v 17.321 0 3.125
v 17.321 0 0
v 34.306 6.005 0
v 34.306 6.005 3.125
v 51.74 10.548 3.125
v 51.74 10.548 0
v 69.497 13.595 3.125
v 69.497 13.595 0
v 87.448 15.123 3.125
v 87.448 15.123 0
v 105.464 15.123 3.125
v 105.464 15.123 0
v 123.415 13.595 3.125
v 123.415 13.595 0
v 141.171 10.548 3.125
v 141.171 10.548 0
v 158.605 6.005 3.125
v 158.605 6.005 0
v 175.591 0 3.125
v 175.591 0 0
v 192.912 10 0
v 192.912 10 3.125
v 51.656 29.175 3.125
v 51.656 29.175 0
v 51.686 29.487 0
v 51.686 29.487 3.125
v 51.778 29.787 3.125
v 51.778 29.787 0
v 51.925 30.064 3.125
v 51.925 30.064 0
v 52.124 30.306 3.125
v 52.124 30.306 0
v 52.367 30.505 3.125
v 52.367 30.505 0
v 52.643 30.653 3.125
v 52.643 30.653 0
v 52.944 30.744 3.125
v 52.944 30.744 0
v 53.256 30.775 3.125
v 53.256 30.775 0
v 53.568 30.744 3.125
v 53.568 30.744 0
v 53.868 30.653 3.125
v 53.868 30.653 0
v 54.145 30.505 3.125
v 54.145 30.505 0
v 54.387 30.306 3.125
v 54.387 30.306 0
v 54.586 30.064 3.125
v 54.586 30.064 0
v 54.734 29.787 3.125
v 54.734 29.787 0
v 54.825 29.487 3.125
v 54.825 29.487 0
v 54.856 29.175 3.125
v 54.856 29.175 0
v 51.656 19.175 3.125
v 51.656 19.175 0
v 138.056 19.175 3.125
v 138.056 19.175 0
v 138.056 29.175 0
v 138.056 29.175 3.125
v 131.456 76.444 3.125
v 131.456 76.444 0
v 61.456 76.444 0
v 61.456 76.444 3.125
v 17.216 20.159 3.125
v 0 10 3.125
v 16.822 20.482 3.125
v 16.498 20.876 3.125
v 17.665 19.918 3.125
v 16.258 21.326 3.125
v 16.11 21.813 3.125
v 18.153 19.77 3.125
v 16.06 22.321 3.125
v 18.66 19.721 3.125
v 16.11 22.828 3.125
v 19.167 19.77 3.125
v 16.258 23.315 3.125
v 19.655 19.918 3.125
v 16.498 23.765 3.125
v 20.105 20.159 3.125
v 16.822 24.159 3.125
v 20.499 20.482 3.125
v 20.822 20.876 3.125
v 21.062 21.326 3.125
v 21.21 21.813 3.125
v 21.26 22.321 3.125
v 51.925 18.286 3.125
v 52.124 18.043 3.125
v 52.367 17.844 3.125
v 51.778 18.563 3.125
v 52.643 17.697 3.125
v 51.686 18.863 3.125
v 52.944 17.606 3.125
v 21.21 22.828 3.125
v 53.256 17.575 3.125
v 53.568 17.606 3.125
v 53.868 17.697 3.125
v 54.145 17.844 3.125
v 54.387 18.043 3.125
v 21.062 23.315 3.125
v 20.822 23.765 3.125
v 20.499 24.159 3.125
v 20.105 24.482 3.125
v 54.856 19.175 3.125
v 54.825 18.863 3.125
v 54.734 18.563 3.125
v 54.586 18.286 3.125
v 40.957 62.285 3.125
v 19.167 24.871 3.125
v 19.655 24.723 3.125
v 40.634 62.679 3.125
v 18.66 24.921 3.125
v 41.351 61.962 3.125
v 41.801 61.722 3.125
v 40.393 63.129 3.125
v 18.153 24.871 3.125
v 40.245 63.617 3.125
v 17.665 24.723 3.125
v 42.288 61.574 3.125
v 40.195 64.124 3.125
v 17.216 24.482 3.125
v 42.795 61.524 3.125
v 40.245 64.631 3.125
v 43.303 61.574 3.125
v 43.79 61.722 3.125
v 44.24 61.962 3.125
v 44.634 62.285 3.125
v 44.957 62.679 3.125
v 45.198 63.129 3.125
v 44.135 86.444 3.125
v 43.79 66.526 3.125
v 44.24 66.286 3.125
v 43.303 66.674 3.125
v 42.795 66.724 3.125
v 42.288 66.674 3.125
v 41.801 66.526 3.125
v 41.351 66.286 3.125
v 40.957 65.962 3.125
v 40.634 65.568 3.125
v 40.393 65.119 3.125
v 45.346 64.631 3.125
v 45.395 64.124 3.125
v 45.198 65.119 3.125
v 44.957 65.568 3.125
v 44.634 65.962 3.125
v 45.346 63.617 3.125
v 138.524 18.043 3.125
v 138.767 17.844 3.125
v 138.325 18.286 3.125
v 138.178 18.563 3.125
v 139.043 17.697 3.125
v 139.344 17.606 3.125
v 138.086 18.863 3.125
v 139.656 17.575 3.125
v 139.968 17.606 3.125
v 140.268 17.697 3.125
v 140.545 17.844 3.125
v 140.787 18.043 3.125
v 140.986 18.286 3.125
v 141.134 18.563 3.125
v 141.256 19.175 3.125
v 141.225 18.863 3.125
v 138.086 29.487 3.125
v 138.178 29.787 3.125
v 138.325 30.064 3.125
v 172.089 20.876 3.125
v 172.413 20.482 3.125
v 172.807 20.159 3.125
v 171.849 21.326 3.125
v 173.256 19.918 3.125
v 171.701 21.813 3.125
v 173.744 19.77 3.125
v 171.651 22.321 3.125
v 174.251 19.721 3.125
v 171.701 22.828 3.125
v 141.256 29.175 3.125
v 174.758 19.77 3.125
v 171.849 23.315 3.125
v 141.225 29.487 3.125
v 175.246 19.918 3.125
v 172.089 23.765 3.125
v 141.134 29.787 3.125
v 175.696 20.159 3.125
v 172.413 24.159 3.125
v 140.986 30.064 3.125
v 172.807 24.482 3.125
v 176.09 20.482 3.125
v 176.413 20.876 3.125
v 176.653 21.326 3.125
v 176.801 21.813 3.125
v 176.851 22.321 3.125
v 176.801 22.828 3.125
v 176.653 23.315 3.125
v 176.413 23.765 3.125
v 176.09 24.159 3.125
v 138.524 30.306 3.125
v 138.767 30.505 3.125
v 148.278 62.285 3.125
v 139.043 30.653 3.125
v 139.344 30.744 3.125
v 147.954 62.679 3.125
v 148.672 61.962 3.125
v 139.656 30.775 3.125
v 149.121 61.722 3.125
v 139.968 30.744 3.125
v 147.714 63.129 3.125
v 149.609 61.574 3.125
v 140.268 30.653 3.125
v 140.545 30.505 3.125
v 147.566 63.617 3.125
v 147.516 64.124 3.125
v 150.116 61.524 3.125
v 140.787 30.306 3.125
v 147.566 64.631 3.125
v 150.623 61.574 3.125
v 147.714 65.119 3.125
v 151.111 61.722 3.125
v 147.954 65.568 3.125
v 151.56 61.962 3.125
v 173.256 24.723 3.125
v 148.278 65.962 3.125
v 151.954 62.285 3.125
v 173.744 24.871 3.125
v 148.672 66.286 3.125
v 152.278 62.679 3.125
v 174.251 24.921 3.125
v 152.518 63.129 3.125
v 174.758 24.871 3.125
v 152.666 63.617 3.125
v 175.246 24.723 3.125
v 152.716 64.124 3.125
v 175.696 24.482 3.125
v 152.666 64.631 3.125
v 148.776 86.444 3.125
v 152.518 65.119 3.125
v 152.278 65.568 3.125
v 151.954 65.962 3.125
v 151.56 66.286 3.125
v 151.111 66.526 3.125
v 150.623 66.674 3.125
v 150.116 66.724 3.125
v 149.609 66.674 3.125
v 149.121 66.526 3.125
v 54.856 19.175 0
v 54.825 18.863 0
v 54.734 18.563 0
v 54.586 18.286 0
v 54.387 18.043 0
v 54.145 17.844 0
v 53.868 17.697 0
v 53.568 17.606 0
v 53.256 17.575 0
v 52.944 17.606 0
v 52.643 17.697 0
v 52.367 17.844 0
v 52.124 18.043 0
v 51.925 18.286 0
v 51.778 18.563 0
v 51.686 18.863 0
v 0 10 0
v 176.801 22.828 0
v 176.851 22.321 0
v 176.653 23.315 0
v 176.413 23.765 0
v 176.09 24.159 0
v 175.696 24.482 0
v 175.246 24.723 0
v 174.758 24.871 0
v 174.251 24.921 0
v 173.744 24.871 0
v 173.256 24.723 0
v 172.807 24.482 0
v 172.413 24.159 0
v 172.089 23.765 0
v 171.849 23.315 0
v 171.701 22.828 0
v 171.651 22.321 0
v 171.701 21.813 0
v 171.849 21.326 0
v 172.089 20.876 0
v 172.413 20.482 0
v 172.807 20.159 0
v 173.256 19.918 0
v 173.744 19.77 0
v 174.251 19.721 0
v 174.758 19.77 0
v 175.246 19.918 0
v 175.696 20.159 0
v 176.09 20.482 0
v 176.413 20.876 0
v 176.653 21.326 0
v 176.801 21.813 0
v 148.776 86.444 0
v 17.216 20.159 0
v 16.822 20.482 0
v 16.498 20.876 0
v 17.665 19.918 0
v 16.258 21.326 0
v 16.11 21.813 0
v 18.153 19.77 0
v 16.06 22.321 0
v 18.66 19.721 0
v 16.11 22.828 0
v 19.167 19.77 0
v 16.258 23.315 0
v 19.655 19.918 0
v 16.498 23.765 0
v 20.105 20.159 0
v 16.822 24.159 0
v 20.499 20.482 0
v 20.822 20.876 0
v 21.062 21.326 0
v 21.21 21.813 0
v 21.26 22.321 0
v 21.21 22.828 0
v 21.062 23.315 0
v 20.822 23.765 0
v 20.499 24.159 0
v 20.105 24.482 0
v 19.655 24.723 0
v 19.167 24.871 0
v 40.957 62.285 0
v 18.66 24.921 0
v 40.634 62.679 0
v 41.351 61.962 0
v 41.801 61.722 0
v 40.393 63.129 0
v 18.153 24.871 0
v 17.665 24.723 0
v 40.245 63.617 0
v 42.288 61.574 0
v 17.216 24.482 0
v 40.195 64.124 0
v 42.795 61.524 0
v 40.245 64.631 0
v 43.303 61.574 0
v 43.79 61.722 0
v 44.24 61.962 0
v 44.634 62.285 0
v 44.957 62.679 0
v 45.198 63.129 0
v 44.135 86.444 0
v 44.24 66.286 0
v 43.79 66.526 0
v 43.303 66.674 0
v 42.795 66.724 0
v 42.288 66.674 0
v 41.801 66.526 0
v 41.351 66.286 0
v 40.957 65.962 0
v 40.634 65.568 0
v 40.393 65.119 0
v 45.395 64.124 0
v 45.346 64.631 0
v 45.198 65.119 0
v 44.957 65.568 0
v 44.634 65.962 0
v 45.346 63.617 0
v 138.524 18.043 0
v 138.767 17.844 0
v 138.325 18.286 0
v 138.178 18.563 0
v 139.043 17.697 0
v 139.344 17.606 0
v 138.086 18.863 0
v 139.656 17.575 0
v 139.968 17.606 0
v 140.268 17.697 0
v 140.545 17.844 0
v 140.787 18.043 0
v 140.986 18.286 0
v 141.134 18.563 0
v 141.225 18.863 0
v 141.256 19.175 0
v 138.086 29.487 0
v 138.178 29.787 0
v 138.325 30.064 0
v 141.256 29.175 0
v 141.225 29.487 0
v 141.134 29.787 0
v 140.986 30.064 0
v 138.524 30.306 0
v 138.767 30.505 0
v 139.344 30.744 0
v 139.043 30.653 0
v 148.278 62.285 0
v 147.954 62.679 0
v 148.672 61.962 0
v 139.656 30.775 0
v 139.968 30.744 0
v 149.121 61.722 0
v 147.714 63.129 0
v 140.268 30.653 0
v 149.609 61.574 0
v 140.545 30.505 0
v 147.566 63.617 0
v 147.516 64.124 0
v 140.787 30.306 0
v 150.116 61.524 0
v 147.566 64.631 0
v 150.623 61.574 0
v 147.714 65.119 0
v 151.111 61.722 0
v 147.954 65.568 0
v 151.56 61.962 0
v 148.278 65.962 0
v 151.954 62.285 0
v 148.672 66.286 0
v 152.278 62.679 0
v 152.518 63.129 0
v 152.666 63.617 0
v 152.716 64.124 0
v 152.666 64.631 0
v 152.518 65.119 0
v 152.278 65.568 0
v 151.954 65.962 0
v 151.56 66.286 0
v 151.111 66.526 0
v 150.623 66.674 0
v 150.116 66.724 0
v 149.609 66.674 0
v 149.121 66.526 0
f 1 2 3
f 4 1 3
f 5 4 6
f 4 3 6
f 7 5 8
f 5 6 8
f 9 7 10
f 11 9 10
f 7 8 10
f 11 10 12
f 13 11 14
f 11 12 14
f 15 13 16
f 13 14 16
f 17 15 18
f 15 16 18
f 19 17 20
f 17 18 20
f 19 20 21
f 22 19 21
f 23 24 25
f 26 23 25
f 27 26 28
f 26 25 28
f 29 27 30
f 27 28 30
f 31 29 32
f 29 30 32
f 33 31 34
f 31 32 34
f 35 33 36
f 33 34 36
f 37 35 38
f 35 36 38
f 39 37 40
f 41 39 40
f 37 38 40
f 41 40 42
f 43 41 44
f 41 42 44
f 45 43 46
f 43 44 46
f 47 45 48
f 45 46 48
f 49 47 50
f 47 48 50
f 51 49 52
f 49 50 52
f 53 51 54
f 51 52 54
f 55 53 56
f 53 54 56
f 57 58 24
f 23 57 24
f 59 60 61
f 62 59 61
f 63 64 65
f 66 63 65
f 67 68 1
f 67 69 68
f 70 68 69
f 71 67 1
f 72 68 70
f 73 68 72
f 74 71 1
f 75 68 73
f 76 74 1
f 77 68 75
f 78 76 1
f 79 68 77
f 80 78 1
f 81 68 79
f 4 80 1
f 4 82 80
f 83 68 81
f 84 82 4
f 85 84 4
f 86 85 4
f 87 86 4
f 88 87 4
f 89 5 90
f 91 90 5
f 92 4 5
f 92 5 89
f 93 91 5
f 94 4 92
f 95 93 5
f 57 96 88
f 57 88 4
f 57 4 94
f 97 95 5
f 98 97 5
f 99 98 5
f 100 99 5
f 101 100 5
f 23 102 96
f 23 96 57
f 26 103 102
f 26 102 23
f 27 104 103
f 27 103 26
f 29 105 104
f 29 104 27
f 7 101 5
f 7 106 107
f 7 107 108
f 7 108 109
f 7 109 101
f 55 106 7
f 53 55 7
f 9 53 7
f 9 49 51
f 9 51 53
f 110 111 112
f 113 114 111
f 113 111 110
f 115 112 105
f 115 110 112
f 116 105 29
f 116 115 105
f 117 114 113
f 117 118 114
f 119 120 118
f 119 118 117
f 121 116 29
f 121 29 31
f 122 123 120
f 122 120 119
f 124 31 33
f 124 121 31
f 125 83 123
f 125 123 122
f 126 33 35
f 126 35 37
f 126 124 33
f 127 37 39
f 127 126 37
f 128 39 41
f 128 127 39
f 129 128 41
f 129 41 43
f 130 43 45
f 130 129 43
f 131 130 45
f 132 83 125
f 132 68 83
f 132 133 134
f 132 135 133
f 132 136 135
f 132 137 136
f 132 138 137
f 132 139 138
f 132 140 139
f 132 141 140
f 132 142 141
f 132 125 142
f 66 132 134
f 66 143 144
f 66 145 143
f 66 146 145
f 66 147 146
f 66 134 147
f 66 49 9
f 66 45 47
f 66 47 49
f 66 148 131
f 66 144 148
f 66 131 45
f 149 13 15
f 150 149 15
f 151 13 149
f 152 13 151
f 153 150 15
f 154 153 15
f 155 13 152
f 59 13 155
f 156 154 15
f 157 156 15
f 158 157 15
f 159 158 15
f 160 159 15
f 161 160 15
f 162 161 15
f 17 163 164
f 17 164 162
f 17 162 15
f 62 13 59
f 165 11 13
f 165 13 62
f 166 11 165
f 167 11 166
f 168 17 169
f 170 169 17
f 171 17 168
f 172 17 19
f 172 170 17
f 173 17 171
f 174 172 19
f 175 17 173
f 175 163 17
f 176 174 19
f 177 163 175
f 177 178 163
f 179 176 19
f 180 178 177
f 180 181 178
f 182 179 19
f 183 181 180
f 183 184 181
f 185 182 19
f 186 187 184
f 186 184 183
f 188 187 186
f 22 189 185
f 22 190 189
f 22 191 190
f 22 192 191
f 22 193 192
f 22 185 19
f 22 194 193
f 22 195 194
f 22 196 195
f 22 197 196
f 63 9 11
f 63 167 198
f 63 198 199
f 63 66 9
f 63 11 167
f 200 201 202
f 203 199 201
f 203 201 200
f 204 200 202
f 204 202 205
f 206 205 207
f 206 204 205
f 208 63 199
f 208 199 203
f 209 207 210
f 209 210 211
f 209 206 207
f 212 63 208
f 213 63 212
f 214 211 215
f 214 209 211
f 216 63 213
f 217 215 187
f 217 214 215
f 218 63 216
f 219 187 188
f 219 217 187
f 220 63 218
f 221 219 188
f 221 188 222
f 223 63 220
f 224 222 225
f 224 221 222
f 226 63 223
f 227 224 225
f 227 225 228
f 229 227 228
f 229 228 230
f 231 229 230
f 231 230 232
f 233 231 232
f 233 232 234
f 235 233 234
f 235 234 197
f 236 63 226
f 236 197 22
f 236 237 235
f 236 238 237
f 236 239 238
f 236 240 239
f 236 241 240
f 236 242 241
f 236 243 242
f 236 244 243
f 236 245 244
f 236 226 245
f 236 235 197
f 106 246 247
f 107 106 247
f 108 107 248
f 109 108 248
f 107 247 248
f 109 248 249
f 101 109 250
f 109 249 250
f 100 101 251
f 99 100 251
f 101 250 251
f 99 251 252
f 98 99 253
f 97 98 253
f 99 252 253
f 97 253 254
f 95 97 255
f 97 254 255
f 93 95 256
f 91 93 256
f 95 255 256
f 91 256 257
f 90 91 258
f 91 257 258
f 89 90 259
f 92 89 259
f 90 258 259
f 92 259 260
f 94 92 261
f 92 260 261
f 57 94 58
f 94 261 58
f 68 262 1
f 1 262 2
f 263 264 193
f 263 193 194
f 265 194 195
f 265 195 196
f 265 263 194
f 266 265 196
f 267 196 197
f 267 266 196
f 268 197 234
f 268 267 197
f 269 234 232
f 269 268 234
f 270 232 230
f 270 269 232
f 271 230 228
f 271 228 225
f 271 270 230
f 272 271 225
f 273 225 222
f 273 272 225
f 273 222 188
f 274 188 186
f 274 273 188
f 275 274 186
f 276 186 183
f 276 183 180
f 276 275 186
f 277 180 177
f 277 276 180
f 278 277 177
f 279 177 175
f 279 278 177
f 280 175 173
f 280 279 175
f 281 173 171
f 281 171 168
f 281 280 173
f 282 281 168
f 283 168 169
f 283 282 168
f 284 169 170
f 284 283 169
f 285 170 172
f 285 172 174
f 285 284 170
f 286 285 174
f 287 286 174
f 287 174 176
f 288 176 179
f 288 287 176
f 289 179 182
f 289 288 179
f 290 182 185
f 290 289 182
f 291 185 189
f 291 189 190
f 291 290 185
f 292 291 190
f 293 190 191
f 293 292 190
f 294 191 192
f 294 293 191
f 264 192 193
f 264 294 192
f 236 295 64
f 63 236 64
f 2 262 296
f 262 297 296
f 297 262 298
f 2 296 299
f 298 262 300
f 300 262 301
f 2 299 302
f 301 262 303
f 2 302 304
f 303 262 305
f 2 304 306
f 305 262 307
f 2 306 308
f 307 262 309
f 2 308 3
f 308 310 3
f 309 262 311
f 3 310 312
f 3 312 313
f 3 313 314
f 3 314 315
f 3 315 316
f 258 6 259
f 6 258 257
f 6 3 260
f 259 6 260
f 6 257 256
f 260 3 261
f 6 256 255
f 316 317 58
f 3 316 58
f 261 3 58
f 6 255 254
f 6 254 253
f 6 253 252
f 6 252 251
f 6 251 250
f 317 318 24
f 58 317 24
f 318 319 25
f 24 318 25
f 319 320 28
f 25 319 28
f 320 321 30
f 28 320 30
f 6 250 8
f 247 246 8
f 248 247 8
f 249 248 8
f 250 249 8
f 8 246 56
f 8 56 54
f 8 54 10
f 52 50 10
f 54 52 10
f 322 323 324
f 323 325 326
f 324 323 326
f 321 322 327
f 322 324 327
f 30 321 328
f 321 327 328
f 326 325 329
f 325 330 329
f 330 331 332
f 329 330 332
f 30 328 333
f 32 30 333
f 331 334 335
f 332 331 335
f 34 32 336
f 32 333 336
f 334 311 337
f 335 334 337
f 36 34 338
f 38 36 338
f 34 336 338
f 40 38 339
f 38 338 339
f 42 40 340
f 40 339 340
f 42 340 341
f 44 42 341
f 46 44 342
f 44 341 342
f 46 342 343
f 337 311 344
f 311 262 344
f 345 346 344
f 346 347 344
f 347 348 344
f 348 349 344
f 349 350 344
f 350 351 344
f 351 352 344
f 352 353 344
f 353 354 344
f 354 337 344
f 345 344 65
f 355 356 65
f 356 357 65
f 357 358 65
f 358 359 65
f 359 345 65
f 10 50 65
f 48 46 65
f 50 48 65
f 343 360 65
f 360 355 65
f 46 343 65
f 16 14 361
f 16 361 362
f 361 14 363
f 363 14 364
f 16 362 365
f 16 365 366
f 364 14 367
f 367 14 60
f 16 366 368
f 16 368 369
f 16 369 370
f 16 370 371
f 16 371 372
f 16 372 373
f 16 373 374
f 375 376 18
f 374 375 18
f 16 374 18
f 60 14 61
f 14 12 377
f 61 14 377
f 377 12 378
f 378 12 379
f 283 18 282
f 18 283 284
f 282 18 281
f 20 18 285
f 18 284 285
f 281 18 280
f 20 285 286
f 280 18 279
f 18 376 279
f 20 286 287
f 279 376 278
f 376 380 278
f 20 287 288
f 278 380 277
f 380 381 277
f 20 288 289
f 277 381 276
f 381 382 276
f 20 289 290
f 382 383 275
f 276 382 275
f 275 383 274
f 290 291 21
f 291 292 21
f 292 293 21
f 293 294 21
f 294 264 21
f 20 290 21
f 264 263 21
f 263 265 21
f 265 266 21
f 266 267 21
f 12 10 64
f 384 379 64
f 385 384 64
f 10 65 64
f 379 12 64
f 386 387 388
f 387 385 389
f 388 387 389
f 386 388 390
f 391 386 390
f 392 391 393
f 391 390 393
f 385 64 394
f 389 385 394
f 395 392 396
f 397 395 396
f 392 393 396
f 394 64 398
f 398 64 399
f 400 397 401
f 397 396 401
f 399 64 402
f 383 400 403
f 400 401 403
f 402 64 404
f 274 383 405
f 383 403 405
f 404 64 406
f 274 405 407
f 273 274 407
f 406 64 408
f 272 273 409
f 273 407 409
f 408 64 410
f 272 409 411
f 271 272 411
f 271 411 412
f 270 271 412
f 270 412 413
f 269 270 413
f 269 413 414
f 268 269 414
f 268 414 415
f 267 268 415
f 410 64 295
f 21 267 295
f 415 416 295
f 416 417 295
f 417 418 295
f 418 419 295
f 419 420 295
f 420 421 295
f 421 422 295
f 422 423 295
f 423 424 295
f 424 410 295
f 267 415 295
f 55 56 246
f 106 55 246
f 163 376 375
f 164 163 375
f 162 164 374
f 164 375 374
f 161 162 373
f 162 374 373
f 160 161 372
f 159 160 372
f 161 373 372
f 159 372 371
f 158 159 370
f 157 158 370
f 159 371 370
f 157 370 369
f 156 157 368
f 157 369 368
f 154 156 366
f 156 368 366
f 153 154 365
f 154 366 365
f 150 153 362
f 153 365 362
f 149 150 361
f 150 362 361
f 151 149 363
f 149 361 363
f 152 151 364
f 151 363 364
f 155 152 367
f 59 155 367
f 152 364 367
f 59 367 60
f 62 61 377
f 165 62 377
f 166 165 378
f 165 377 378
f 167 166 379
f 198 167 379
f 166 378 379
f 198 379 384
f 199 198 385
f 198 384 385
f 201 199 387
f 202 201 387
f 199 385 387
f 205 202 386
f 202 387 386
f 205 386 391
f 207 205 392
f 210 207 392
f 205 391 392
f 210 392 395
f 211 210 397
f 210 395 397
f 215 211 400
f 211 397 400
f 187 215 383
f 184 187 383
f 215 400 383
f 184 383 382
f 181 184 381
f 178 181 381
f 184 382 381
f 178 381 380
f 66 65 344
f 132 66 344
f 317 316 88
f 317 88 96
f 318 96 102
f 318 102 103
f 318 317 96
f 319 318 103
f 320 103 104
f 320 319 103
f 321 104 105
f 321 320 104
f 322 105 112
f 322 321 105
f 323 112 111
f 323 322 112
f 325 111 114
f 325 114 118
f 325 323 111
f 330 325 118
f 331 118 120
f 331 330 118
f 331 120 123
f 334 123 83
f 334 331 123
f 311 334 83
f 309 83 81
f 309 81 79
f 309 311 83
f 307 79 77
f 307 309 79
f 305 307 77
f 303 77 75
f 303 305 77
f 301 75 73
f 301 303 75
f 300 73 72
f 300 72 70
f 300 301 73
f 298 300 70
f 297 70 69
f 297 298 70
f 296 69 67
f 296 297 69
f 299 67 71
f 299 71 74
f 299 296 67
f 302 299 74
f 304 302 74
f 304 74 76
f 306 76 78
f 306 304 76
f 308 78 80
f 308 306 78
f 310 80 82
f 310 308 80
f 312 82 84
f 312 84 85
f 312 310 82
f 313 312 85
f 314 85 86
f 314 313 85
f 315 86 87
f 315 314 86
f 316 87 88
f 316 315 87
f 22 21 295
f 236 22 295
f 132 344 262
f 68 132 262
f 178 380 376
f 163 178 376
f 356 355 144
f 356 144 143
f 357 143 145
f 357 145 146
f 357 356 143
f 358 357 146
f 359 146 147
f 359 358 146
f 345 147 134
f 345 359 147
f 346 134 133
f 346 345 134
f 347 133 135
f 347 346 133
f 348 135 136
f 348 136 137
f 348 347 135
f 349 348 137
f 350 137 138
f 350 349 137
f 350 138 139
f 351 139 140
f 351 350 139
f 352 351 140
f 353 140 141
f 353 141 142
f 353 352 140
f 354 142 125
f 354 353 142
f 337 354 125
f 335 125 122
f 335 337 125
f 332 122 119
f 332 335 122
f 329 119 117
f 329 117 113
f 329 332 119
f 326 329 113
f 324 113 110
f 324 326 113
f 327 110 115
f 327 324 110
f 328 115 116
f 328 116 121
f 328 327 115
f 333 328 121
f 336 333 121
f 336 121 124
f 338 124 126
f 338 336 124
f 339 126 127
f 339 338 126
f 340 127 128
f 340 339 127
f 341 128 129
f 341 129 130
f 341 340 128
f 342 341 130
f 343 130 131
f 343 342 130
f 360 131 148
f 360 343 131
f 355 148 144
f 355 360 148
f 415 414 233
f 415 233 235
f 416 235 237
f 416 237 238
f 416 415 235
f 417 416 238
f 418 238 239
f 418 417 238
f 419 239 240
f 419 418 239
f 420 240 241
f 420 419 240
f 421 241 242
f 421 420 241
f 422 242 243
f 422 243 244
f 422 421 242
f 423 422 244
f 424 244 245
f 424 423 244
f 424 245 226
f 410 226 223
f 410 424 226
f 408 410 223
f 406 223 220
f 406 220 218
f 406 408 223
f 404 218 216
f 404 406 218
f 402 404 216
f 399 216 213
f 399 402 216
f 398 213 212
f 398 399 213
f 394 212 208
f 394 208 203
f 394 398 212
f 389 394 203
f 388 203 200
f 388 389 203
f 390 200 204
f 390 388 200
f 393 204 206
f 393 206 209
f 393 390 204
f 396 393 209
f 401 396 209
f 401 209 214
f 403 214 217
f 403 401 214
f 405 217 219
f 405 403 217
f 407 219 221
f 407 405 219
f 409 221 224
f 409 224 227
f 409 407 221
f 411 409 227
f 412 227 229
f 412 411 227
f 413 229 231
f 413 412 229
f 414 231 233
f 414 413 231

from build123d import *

# Parameters (mm, degrees)
MODEL_R             = 2.6
BOSS_EXTRUDE1_DEPTH = 3.125


with BuildPart() as part:
    # Model → Boss-Extrude1 (new body)
    with BuildSketch(Plane.XY):
        with BuildLine():
            Line((175.590993043, 0), (192.911501119, 10))
            Line((192.911501119, 10), (148.776258635, 86.444482386))
            Line((148.776258635, 86.444482386), (131.455750559, 76.444482386))
            Line((131.455750559, 76.444482386), (61.455750559, 76.444482386))
            Line((61.455750559, 76.444482386), (44.135242484, 86.444482386))
            Line((44.135242484, 86.444482386), (0, 10))
            Line((0, 10), (17.320508076, 0))
            ThreePointArc((17.320508076, 0), (96.455750559, 15.314685), (175.590993043, 0))
        make_face()
        with Locations((42.795496522, 64.123974311)):
            Circle(MODEL_R, mode=Mode.SUBTRACT)
        with Locations((18.660254038, 22.320508076)):
            Circle(MODEL_R, mode=Mode.SUBTRACT)
        with Locations((150.116004597, 64.123974311)):
            Circle(MODEL_R, mode=Mode.SUBTRACT)
        with Locations((174.251247081, 22.320508076)):
            Circle(MODEL_R, mode=Mode.SUBTRACT)
        with BuildLine():
            Line((54.855750559, 29.174833766), (54.855750559, 19.174833766))
            ThreePointArc((54.855750559, 19.174833766), (53.255750559, 17.574833766), (51.655750559, 19.174833766))
            Line((51.655750559, 19.174833766), (51.655750559, 29.174833766))
            ThreePointArc((51.655750559, 29.174833766), (53.255750559, 30.774833766), (54.855750559, 29.174833766))
        make_face(mode=Mode.SUBTRACT)
        with BuildLine():
            Line((141.255750559, 29.174833766), (141.255750559, 19.174833766))
            ThreePointArc((141.255750559, 19.174833766), (139.655750559, 17.574833766), (138.055750559, 19.174833766))
            Line((138.055750559, 19.174833766), (138.055750559, 29.174833766))
            ThreePointArc((138.055750559, 29.174833766), (139.655750559, 30.774833766), (141.255750559, 29.174833766))
        make_face(mode=Mode.SUBTRACT)
    extrude(amount=BOSS_EXTRUDE1_DEPTH)


solid = part.part
